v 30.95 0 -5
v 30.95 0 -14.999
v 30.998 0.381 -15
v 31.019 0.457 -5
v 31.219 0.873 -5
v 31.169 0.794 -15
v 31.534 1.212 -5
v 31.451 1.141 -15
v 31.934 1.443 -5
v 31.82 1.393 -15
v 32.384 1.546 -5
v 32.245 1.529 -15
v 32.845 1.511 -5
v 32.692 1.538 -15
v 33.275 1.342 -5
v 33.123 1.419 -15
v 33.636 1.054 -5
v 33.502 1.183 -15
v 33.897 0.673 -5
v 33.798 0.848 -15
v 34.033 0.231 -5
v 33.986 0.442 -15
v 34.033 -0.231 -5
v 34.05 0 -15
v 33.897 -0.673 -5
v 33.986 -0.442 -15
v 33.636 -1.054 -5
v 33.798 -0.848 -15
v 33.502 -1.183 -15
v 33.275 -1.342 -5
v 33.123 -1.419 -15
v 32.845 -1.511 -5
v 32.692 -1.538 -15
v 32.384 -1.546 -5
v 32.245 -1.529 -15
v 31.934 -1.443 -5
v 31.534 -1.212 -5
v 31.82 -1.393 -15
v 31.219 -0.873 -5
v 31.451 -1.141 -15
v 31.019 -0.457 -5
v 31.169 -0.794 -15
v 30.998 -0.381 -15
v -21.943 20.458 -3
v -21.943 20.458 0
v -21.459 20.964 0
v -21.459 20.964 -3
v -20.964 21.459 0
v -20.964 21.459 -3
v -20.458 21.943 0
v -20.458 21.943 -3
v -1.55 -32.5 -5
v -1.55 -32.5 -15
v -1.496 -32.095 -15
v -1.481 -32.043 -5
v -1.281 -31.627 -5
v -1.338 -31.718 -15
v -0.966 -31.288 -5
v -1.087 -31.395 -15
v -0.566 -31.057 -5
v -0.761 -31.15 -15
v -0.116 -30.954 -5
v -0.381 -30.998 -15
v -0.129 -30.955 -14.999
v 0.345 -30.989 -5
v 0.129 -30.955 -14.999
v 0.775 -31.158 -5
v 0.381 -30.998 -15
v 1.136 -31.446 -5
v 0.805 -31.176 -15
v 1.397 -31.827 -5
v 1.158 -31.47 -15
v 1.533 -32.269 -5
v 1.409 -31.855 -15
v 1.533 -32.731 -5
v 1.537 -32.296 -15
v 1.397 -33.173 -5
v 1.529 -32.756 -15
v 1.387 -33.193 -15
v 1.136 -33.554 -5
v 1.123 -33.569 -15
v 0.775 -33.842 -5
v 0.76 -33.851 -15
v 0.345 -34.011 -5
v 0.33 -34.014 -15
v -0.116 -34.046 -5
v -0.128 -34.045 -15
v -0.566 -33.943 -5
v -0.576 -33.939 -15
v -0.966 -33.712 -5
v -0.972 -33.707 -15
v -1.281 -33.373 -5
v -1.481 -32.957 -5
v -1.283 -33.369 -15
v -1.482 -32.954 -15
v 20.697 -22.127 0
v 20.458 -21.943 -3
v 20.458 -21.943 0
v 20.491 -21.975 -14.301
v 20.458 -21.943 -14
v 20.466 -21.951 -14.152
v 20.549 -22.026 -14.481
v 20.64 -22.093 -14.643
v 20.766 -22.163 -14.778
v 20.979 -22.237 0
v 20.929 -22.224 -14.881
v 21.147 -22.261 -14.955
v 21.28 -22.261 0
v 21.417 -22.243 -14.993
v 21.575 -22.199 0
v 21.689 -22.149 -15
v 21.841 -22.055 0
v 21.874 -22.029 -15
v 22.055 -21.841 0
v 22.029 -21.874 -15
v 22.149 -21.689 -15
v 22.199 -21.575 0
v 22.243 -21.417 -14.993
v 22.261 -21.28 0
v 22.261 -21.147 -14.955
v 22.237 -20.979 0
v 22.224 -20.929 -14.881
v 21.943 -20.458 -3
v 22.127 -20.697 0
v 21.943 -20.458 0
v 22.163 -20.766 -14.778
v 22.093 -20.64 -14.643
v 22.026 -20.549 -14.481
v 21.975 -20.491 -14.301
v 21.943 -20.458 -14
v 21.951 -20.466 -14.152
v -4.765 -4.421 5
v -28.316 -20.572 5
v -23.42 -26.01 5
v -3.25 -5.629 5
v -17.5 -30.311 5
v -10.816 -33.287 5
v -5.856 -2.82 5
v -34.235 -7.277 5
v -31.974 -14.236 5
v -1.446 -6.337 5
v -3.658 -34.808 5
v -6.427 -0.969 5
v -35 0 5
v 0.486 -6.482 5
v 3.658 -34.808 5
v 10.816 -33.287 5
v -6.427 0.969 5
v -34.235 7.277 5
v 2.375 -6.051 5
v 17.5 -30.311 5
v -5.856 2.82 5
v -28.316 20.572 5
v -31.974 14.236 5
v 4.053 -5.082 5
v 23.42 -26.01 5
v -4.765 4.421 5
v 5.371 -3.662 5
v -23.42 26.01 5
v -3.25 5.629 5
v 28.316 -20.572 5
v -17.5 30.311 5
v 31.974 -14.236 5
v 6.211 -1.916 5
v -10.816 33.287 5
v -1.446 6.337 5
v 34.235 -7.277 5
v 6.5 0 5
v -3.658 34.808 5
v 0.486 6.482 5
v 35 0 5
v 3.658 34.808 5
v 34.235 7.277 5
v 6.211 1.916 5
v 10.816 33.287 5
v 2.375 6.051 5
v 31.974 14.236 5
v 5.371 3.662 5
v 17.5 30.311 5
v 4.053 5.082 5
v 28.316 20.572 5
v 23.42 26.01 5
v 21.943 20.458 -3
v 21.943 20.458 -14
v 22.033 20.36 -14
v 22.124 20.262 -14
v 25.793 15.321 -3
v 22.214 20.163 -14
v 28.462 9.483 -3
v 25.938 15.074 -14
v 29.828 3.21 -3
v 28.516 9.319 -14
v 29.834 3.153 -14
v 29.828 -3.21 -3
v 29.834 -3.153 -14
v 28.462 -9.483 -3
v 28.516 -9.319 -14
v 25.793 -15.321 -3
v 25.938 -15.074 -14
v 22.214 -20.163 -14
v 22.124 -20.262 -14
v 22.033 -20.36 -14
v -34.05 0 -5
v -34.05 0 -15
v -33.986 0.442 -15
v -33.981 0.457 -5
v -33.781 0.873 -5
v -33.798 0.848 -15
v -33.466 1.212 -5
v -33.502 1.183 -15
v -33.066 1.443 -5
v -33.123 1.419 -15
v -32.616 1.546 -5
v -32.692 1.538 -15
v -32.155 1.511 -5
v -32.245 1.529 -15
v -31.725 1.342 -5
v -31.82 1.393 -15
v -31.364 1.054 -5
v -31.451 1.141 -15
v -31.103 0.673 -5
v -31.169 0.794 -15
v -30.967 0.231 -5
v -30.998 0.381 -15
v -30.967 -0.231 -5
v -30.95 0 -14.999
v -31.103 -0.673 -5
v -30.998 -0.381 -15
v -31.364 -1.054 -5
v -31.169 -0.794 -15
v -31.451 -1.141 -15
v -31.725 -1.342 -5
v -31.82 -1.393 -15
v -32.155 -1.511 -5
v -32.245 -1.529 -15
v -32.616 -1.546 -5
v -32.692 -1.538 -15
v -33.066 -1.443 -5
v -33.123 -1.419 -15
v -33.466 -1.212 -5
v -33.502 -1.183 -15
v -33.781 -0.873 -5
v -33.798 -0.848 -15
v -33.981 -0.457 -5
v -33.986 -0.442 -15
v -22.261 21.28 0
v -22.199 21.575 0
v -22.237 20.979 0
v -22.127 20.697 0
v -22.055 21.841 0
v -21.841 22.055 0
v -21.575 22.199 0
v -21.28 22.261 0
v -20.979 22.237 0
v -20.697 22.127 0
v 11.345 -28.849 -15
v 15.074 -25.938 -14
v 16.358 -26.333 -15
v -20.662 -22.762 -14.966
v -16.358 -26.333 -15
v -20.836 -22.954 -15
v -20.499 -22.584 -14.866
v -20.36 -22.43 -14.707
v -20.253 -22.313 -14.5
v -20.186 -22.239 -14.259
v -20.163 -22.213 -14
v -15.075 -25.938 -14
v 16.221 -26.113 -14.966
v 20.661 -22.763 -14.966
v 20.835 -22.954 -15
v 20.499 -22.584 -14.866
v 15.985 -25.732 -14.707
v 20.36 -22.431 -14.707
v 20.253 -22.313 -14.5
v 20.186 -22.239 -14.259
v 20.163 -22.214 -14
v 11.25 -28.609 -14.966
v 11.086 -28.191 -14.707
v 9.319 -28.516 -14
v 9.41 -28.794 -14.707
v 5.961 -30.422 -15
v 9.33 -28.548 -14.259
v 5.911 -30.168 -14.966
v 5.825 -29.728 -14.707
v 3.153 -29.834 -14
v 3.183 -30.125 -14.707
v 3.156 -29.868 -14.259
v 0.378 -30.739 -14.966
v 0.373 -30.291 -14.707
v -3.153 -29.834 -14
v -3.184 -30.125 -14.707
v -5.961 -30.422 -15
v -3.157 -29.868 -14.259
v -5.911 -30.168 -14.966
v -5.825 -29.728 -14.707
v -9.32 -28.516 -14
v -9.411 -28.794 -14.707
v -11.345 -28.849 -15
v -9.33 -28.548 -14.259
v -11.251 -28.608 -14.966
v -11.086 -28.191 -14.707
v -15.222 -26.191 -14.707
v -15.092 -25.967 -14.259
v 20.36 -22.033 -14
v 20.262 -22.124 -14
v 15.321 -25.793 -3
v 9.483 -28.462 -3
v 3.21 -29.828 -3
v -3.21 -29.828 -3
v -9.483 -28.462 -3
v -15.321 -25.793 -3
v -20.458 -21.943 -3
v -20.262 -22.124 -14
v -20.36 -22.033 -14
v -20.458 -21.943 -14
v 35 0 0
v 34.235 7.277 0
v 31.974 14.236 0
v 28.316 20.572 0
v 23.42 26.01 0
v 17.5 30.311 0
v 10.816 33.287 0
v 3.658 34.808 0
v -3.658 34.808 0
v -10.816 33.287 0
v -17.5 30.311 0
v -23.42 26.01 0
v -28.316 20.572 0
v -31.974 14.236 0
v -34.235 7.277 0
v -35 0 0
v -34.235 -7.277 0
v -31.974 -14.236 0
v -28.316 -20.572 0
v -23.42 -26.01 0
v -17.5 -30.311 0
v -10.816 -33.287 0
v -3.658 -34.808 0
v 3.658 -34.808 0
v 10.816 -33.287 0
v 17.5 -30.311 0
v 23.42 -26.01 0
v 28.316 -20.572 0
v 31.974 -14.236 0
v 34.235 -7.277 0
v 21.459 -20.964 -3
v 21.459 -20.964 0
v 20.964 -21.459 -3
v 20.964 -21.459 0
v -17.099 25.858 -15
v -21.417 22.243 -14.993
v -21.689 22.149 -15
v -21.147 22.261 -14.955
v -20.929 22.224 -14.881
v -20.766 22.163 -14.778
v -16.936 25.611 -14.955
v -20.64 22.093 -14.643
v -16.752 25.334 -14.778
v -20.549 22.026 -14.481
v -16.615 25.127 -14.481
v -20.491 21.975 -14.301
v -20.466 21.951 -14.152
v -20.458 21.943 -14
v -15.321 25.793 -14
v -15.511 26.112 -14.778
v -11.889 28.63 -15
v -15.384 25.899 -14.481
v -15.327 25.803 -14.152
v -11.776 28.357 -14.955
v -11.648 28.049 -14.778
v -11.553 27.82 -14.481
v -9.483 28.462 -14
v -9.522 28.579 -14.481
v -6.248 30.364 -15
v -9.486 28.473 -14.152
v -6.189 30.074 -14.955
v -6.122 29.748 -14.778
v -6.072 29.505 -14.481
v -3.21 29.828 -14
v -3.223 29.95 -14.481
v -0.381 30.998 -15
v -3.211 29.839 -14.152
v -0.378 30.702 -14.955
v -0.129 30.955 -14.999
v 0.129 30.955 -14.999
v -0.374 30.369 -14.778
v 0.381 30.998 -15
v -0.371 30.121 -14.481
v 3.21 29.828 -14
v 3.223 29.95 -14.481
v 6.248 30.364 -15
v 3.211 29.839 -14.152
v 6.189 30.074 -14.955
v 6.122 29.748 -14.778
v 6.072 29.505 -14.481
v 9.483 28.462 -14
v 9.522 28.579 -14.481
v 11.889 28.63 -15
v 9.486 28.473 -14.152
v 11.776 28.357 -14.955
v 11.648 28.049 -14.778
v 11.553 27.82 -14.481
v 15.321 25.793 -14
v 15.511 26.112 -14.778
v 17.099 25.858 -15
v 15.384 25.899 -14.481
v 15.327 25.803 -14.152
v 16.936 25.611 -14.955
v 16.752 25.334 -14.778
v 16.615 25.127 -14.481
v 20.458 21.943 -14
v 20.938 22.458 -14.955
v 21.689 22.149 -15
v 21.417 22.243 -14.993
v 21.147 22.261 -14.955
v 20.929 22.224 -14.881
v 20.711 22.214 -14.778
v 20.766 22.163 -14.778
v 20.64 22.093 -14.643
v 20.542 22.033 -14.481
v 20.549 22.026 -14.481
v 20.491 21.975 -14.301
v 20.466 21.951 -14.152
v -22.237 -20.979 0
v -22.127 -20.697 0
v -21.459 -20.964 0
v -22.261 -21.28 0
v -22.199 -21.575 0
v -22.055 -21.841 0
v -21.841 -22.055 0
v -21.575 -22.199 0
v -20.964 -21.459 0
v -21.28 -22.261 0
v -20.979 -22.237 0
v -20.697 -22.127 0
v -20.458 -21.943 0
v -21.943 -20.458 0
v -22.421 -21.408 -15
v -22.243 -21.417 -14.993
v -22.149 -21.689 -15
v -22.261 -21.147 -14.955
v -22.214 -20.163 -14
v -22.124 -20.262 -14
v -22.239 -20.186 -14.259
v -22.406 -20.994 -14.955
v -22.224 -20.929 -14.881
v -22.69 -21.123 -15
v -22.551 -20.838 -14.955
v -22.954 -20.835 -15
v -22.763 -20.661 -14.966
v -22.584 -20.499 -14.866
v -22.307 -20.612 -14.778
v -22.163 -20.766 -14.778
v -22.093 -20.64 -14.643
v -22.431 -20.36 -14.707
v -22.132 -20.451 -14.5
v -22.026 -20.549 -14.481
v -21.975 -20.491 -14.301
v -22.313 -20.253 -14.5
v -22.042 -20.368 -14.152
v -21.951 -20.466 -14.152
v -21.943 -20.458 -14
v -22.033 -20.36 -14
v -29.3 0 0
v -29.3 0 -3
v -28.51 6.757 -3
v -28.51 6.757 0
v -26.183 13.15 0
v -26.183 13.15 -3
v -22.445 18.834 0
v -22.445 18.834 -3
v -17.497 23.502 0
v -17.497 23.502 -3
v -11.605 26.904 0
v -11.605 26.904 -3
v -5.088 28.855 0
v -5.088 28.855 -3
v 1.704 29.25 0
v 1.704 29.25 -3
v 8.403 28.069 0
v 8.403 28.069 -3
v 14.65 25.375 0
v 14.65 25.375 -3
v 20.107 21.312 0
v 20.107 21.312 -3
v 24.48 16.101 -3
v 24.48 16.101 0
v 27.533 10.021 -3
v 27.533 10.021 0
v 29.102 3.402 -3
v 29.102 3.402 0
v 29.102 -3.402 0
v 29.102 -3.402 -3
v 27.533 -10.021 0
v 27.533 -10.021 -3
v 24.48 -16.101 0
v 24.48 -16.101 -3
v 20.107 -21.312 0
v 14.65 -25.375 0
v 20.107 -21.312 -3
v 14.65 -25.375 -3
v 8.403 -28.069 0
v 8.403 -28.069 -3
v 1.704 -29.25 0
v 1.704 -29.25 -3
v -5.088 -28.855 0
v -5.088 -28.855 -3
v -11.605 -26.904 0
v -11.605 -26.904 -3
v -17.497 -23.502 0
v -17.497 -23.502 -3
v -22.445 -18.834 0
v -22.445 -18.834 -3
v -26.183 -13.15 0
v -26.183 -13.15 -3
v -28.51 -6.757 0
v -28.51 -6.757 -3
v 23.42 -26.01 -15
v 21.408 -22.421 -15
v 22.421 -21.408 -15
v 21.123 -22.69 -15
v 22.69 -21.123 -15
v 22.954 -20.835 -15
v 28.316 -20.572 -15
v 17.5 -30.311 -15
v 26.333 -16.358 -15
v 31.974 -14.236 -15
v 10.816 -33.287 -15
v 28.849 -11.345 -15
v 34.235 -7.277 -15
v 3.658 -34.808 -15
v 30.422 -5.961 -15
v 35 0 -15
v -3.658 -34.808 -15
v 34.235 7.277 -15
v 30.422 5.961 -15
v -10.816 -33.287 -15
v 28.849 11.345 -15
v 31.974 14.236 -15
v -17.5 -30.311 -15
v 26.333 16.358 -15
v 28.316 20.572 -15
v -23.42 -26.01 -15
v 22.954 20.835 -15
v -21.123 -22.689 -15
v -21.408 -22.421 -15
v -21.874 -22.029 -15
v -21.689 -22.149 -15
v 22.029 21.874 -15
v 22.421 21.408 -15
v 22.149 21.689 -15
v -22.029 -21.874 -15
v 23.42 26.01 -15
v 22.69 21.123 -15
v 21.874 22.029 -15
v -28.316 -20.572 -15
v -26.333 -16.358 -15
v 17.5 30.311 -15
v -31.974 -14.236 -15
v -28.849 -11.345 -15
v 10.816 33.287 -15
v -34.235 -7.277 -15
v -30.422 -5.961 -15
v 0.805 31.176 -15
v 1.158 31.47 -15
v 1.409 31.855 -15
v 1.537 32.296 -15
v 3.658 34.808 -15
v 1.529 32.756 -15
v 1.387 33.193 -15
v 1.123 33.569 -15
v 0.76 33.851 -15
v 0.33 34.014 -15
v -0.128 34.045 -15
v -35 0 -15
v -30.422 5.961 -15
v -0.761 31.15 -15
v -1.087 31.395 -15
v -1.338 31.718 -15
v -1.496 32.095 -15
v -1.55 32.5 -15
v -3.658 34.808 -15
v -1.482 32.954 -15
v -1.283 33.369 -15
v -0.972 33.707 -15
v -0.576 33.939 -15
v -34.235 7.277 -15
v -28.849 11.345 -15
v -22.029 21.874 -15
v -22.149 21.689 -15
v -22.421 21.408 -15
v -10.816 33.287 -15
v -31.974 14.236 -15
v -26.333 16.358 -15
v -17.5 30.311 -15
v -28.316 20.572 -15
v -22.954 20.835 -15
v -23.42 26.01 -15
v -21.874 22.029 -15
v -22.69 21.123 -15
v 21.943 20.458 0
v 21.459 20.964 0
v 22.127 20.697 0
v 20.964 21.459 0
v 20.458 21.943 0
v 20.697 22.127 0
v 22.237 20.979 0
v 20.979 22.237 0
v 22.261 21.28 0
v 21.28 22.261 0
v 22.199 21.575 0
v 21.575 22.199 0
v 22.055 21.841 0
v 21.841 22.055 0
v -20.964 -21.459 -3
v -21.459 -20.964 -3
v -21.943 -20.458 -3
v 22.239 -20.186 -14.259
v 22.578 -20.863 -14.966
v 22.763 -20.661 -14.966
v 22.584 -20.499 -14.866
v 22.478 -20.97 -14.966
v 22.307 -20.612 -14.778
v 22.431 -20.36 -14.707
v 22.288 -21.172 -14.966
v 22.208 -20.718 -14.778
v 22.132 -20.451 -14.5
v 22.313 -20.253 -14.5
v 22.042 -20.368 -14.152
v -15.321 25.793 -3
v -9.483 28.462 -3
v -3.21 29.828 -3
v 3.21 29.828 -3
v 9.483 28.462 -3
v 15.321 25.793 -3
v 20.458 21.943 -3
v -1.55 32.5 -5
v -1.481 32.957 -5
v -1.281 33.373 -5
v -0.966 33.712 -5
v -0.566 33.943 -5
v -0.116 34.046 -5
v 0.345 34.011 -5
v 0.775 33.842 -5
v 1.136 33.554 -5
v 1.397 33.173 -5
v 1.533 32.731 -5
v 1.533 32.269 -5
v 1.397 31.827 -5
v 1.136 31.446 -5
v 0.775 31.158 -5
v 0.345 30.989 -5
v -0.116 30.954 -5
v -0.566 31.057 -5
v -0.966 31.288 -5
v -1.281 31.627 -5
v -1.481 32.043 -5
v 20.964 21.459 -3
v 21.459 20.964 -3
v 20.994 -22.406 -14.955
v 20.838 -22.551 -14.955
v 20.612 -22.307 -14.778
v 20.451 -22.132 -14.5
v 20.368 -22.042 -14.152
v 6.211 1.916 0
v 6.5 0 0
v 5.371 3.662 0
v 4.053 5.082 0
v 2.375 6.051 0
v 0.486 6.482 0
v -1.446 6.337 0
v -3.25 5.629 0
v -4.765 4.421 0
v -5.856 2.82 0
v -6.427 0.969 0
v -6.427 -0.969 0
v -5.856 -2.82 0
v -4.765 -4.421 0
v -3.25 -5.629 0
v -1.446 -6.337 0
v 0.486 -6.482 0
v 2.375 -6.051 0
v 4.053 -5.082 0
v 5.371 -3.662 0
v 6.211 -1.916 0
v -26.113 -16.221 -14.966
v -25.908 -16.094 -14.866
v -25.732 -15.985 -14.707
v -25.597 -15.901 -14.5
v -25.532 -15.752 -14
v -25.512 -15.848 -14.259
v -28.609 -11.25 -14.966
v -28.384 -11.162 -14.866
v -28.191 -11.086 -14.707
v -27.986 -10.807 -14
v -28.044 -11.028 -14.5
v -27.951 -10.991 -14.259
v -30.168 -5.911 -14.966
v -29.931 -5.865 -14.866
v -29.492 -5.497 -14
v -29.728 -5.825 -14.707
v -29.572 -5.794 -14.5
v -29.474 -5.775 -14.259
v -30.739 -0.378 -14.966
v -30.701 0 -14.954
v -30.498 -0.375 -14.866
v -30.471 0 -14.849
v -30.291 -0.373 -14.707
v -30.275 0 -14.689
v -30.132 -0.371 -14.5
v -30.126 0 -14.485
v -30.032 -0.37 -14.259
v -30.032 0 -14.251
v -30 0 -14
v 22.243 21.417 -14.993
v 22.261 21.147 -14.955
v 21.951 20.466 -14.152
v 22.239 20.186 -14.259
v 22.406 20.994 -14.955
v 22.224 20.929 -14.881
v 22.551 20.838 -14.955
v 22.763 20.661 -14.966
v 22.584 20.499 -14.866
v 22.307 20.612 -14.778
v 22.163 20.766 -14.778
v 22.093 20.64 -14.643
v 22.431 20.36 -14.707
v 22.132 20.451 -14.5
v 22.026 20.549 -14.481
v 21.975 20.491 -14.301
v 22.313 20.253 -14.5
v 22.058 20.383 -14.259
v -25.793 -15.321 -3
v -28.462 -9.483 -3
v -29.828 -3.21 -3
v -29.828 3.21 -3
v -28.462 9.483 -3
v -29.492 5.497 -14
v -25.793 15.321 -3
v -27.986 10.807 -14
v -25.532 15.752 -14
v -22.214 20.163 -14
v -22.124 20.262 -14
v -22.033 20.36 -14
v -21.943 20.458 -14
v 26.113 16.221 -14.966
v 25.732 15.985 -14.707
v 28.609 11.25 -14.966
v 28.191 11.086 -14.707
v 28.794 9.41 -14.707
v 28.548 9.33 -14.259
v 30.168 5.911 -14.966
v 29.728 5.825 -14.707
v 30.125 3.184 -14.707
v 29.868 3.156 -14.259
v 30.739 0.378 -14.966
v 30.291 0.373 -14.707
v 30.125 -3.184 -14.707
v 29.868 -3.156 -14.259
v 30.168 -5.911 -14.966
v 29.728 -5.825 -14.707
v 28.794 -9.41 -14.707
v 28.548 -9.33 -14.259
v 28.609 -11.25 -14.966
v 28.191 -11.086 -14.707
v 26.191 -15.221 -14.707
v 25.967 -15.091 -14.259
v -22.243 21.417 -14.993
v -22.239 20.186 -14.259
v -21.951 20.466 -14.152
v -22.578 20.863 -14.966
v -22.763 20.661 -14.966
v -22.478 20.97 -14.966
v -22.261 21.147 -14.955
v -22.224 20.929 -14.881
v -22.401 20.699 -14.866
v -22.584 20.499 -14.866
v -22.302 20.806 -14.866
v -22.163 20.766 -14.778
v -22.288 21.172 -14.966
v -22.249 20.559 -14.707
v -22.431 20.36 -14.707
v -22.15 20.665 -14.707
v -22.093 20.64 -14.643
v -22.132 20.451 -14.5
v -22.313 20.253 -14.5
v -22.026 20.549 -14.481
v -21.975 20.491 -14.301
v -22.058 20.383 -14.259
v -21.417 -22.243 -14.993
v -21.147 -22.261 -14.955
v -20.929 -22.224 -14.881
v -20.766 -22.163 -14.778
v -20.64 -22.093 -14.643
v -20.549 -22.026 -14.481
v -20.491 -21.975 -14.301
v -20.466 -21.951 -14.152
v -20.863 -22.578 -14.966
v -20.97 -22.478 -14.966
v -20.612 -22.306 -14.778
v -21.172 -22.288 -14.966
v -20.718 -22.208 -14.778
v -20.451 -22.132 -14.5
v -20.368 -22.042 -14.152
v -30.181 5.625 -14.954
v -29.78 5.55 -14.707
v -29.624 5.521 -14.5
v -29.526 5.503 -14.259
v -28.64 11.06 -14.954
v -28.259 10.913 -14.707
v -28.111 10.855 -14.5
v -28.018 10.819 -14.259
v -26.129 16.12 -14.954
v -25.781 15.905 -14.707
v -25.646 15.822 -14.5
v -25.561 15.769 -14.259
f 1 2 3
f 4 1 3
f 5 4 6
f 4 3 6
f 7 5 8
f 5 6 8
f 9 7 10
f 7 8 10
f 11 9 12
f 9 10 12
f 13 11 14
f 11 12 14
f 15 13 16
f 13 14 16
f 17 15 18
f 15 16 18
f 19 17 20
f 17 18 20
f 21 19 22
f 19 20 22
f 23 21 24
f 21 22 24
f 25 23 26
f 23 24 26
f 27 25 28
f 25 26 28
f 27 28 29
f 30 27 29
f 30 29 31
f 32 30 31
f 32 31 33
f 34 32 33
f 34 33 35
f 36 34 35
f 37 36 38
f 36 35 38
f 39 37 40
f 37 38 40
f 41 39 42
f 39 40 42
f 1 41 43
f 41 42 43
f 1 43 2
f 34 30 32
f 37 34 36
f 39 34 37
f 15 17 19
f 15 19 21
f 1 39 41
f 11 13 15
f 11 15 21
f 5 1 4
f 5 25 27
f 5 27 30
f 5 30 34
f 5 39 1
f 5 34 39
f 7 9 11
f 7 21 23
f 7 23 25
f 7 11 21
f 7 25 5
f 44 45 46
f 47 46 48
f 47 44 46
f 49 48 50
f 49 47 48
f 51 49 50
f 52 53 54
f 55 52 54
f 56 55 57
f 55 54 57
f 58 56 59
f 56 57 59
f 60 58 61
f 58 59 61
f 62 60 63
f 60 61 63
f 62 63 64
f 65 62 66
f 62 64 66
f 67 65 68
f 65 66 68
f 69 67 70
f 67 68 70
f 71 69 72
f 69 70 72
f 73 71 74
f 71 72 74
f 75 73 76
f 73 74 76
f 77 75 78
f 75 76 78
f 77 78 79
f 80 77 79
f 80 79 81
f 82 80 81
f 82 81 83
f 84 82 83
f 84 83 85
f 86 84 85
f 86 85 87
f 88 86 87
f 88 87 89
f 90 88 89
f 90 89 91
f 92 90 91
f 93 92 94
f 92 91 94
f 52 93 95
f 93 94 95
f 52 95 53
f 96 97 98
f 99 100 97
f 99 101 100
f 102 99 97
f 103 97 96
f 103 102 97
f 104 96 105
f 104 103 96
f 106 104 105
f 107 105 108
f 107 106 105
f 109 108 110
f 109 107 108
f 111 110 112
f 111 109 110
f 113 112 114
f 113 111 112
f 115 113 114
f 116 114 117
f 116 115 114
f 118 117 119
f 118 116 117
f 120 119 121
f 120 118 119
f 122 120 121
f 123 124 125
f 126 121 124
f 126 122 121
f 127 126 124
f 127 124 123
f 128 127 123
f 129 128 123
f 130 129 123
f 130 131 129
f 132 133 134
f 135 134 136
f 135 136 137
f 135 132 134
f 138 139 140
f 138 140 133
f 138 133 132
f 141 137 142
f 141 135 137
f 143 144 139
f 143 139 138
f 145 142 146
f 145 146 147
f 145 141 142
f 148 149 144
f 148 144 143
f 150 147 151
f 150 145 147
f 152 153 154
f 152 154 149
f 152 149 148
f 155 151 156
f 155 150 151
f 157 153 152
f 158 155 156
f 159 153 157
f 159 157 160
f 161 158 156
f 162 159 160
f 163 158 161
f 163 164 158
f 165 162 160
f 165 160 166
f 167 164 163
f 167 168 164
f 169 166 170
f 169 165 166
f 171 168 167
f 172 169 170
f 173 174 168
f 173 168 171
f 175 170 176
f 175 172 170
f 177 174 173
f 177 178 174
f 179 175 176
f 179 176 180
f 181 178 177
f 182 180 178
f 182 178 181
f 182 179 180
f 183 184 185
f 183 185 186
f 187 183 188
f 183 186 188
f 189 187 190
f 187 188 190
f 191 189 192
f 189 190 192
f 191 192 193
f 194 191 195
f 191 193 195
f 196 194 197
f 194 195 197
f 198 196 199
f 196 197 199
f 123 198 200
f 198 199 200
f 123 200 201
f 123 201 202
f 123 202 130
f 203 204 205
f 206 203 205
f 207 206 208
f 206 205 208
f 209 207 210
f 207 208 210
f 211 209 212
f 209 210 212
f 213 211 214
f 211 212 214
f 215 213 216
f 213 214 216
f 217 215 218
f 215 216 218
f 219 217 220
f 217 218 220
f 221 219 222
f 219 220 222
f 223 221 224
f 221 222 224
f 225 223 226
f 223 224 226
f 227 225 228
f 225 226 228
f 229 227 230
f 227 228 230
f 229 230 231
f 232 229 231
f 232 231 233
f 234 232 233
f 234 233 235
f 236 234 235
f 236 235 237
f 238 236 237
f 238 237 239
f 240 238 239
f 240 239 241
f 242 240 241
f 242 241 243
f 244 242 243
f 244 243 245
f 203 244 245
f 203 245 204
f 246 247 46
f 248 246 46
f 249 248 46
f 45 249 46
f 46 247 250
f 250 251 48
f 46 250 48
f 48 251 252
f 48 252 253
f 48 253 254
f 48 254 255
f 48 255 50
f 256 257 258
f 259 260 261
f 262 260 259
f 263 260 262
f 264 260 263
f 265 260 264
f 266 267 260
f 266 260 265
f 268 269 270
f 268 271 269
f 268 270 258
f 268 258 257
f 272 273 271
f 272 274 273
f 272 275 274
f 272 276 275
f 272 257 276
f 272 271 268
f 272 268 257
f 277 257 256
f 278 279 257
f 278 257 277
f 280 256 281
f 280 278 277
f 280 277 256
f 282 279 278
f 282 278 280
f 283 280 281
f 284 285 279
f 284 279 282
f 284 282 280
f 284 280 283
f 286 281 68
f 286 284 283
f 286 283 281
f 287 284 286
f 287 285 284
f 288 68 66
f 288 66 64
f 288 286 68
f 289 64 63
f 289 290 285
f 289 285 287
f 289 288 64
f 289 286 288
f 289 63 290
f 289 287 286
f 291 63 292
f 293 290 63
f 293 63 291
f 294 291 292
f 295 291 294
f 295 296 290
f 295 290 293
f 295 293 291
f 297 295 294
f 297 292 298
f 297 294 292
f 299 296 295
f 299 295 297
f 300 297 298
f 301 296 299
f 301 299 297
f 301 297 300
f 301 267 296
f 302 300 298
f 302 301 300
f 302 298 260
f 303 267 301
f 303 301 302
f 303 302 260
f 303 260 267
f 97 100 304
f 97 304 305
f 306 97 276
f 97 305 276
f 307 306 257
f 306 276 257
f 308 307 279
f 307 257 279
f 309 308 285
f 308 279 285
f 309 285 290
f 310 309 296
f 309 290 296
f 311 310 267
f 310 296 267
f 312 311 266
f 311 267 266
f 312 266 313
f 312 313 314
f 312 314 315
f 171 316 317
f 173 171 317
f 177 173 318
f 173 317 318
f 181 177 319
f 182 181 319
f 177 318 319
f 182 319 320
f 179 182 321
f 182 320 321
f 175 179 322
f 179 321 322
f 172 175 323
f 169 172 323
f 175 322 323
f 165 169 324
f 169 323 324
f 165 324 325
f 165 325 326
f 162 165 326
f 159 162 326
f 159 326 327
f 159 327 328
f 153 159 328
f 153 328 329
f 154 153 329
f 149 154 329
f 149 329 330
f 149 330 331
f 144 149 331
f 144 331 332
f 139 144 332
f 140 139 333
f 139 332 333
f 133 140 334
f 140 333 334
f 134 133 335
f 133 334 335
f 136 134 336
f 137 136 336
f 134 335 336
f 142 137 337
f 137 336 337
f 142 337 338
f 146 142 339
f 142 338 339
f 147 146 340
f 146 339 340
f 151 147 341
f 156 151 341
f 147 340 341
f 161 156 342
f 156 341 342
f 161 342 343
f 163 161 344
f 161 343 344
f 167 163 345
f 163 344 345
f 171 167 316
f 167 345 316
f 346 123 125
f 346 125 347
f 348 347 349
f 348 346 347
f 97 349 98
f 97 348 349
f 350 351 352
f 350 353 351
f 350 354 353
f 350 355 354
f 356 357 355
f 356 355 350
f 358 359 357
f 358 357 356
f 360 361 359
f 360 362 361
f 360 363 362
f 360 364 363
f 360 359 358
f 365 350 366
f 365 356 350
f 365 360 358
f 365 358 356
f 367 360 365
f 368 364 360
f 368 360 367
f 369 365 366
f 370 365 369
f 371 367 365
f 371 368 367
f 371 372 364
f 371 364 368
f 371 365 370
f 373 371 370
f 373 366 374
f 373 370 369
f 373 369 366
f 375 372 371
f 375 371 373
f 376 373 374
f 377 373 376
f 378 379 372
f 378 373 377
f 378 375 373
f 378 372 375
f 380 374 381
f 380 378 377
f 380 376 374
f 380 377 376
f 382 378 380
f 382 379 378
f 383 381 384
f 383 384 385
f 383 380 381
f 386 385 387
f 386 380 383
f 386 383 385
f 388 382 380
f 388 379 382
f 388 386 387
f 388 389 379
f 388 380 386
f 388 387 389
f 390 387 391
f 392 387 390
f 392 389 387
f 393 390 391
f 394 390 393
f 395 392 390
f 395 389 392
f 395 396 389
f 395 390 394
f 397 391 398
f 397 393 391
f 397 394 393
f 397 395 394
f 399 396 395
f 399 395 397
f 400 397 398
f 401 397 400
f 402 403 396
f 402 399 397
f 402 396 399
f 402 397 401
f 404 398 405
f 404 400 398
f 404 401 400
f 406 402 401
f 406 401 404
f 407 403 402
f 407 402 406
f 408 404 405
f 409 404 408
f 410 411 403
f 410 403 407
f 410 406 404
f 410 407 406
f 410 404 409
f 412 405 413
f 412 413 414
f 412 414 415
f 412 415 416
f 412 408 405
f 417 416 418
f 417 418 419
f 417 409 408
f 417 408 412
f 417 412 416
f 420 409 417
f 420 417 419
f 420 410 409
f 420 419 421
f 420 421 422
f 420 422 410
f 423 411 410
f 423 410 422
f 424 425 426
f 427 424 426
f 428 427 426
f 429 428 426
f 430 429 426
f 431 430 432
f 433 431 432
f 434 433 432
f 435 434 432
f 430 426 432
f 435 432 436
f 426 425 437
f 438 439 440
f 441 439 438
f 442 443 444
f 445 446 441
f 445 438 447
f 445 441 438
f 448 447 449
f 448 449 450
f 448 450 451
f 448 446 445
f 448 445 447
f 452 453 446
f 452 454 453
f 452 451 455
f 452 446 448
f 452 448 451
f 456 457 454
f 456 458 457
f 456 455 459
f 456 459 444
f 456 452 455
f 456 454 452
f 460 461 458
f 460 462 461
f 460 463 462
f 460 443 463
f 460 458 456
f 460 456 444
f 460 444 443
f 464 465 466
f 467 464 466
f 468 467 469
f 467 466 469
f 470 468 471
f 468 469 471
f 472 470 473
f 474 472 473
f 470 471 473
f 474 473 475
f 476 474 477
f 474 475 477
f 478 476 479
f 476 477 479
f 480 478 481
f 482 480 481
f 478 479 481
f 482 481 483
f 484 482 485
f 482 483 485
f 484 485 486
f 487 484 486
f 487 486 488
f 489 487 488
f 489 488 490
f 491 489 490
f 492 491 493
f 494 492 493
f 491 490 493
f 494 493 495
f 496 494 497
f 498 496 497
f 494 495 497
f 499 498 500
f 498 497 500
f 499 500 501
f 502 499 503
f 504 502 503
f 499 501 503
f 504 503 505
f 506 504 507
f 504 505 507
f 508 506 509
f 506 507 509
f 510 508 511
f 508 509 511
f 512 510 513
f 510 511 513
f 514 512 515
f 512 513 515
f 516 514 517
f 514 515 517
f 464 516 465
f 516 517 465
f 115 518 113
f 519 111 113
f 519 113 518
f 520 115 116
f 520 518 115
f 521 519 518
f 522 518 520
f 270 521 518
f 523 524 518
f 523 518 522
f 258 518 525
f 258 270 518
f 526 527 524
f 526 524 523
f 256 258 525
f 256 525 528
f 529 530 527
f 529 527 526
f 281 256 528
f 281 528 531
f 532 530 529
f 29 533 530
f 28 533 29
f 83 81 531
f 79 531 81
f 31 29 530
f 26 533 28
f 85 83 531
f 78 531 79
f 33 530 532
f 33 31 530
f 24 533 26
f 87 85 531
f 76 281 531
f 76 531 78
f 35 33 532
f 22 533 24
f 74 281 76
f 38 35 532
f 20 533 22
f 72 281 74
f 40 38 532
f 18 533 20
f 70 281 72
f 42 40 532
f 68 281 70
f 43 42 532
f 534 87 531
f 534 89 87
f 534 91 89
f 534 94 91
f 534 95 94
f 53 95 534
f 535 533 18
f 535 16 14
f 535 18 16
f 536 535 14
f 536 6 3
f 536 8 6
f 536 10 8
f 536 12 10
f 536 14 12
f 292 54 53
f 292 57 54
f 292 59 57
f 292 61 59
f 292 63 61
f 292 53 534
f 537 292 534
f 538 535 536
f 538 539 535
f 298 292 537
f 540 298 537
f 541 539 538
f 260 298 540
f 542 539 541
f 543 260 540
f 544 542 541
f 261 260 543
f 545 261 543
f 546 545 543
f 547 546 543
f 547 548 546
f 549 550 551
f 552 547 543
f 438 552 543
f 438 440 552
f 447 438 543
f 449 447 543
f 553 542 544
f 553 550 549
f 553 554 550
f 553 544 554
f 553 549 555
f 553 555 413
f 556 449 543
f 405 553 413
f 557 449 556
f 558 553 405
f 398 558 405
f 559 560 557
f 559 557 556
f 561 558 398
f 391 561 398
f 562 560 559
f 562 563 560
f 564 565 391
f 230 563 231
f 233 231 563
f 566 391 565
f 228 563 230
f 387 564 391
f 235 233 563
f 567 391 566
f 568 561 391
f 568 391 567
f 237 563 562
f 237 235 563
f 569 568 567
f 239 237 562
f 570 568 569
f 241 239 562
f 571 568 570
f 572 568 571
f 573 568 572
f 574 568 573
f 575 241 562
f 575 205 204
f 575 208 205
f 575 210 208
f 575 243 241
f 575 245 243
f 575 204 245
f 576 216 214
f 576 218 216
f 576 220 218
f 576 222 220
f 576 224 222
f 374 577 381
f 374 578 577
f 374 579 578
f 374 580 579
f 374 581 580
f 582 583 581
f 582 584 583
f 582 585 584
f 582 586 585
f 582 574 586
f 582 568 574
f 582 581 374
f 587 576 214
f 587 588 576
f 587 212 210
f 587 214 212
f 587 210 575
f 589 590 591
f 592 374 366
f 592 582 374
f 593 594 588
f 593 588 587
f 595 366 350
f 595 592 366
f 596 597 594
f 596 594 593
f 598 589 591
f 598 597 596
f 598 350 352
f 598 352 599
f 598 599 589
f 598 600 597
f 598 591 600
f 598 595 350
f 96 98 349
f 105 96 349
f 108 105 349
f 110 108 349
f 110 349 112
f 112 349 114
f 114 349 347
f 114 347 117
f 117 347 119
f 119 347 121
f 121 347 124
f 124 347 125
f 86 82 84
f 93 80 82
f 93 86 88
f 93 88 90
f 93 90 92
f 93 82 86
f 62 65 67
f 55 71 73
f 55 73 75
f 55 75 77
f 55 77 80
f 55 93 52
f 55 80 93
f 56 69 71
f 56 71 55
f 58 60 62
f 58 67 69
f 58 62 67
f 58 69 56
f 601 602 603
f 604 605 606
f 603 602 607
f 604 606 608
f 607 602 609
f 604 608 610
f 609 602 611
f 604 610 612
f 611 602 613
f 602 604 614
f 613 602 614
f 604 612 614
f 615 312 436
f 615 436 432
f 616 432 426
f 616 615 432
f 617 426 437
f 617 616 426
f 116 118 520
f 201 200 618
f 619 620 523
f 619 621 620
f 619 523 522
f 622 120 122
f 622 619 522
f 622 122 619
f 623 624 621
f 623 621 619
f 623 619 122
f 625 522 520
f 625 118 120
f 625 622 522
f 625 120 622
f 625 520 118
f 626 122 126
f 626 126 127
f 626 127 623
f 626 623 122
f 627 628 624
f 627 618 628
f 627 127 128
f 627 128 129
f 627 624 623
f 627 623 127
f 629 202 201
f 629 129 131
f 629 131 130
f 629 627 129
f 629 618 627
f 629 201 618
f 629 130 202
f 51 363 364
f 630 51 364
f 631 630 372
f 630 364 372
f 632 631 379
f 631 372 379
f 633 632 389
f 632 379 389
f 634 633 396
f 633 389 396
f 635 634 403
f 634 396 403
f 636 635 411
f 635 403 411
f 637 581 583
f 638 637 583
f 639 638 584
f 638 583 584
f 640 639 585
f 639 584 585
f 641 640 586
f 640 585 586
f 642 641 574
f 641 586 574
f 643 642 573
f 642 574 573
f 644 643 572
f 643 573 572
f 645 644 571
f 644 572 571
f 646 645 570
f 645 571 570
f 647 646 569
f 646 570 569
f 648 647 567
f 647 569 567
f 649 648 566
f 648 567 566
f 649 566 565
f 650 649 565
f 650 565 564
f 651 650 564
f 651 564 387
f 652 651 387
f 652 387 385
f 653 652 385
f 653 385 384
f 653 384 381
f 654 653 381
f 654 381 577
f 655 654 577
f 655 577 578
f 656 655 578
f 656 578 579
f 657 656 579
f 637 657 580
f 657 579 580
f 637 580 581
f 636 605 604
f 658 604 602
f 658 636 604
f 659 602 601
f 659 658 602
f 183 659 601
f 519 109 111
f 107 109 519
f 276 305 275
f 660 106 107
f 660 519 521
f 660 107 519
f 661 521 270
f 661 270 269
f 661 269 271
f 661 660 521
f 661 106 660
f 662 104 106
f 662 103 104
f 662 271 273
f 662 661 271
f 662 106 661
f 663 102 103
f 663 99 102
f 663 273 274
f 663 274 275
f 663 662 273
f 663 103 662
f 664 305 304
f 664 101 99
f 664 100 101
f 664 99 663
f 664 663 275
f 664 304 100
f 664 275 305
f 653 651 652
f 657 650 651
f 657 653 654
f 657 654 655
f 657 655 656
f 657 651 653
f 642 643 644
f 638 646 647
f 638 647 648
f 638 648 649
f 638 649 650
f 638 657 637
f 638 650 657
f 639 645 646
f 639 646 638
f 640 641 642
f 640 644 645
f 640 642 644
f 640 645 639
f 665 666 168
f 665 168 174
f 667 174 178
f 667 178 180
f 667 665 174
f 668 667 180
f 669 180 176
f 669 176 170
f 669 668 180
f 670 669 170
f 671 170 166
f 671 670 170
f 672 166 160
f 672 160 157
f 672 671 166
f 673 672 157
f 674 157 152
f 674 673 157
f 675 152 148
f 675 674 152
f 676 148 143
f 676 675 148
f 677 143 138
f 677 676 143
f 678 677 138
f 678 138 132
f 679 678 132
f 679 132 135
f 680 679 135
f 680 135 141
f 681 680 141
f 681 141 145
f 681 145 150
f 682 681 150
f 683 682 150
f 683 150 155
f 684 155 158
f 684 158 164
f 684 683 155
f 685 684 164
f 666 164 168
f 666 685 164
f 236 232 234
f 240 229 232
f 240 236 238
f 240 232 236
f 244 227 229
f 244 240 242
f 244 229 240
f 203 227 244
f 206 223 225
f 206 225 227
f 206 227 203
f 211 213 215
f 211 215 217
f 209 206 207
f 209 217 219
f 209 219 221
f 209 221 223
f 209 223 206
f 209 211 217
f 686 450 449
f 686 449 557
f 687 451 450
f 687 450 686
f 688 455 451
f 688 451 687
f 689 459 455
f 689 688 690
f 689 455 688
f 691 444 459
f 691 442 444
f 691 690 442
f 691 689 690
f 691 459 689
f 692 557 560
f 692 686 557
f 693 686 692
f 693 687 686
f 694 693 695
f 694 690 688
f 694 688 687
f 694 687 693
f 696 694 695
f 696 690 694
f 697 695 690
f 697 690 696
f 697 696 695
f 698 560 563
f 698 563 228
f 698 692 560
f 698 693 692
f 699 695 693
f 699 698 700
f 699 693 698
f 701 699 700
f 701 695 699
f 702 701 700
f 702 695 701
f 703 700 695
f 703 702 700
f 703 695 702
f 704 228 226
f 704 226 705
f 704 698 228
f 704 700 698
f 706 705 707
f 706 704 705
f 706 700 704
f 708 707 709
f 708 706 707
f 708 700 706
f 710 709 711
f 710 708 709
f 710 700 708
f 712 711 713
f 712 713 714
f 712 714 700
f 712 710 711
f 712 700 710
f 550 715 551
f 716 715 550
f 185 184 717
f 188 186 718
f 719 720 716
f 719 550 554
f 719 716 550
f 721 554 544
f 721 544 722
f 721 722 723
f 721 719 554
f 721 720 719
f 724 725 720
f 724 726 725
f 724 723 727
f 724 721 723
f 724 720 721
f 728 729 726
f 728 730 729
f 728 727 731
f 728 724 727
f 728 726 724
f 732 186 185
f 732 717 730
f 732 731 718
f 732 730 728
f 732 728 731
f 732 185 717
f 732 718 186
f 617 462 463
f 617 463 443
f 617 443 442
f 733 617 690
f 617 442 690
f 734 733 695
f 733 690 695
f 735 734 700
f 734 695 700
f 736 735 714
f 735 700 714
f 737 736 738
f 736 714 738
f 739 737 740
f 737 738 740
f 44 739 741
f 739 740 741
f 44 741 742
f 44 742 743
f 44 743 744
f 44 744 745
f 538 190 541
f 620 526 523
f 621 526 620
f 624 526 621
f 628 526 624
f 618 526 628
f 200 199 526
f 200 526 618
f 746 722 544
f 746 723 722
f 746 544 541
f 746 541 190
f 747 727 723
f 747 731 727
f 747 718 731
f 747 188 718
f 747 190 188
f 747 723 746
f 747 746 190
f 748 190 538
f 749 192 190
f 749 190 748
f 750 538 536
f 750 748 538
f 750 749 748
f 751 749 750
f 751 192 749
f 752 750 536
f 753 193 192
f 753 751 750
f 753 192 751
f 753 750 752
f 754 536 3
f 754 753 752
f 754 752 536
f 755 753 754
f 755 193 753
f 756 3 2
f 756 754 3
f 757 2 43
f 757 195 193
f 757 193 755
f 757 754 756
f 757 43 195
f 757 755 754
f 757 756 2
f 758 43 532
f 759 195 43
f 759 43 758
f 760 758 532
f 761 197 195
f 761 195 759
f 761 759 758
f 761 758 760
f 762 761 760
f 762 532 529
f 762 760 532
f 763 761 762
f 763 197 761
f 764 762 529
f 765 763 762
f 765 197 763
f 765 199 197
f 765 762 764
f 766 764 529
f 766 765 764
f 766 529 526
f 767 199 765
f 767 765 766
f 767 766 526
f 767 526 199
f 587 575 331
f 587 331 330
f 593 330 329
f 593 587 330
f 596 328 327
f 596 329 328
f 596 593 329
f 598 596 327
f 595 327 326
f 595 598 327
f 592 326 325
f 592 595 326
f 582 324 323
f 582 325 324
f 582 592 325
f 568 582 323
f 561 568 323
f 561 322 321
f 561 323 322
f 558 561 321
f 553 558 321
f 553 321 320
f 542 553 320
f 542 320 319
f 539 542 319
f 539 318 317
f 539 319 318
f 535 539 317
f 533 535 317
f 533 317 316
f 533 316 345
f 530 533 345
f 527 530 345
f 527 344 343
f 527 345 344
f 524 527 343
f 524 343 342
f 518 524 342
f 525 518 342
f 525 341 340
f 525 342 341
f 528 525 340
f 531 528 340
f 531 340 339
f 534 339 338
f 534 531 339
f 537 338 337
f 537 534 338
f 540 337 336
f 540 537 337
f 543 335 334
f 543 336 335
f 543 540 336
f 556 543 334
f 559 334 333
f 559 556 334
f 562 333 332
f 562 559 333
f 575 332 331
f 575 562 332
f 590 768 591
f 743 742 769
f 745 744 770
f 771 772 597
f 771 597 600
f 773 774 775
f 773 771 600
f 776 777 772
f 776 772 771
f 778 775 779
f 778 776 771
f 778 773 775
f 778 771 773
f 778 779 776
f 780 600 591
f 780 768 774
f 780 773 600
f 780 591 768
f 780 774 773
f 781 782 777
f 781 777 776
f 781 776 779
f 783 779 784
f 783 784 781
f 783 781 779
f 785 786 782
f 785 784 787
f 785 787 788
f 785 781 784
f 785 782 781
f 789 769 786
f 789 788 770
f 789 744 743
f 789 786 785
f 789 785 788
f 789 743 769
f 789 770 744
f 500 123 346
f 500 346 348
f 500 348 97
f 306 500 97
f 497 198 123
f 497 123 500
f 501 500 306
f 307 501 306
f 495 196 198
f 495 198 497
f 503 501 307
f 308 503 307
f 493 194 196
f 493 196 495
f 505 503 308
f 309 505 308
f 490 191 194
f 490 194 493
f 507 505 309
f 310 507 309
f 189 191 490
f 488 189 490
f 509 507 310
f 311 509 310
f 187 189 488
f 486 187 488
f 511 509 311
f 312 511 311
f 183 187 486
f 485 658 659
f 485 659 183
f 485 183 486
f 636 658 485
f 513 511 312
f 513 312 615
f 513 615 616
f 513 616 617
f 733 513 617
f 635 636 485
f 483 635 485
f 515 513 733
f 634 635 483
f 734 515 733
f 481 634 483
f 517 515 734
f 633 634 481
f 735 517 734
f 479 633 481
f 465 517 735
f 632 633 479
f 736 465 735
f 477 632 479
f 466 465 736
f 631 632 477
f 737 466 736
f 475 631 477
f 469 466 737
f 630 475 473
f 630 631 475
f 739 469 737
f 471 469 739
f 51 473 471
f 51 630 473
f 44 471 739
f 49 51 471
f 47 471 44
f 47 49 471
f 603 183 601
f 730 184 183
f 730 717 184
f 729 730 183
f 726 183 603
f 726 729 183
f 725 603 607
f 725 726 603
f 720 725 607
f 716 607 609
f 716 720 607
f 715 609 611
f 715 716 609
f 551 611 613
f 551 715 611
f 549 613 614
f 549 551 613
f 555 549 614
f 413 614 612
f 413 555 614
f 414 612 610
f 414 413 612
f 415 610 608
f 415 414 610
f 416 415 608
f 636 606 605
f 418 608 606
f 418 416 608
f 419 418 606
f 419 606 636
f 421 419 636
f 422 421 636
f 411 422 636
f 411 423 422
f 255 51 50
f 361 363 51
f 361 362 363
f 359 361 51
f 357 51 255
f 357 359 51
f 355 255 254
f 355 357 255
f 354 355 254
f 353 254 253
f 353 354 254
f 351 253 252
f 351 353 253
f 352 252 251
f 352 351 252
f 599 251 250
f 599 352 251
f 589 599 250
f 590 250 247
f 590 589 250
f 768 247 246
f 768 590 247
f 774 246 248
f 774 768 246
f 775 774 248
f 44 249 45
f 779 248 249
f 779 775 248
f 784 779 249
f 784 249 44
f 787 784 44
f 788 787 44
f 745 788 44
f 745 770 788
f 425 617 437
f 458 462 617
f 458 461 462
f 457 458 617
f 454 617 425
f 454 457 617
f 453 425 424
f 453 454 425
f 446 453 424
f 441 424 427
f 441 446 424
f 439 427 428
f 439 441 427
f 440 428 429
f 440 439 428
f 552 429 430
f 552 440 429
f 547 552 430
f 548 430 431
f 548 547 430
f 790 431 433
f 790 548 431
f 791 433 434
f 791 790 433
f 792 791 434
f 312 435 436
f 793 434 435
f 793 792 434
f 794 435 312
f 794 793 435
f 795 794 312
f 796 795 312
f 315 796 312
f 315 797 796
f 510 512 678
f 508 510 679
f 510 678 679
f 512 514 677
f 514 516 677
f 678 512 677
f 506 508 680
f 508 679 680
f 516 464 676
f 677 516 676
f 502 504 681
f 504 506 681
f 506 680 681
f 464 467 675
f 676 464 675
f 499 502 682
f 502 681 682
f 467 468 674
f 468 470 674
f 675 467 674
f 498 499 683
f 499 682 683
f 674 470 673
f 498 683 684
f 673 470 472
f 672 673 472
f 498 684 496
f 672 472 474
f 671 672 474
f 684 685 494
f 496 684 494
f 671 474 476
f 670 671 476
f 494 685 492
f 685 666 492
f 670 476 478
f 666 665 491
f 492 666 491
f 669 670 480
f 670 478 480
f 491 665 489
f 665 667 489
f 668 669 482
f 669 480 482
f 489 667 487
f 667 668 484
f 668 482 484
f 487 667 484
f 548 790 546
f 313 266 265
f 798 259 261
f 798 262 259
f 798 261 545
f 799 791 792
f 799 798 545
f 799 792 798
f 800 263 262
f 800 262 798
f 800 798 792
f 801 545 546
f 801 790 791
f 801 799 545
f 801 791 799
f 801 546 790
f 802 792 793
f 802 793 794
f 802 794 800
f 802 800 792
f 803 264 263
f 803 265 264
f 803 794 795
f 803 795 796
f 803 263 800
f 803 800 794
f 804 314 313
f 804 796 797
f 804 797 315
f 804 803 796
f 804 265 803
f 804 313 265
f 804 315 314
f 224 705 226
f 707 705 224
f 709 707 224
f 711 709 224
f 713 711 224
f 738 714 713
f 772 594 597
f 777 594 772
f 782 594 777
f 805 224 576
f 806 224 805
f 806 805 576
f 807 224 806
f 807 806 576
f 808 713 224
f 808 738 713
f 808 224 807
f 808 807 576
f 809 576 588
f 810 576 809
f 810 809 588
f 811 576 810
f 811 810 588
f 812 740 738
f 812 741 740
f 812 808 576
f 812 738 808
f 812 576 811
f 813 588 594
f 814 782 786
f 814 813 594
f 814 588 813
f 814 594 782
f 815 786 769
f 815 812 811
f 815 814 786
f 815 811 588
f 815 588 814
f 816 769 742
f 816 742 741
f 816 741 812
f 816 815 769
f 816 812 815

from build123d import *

# Parameters (mm, degrees)
SKETCH_2_R          = 35
SKETCH_2_R_2        = 6.5
EXTRUDE_1_DEPTH     = 5
EXTRUDE_START       = 15
SKETCH_3_R          = 35
SKETCH_3_R_2        = 30
EXTRUDE_2_DEPTH     = 15
SKETCH_4_R          = 1.55
CUT_EXTRUDE_1_DEPTH = 10
CUT_EXTRUDE_5_DEPTH = 15
FILLET_1_R          = 1
EXTRUDE_START_2     = 3
SKETCH_10_R         = 30
SKETCH_10_R_2       = 29.3
EXTRUDE_3_DEPTH     = 3


with BuildPart() as part:
    # 草图2 → 凸台-拉伸1 (new body)
    with BuildSketch(Plane.XY):
        Circle(SKETCH_2_R)
        Circle(SKETCH_2_R_2, mode=Mode.SUBTRACT)
    extrude(amount=EXTRUDE_1_DEPTH)

    # 草图3 → 凸台-拉伸2 (add)
    with BuildSketch(Plane(origin=(0, 0, 0), x_dir=(-1, 0, 0), z_dir=(0, 0, -1)).offset(EXTRUDE_START)):
        Circle(SKETCH_3_R)
        Circle(SKETCH_3_R_2, mode=Mode.SUBTRACT)
    extrude(amount=-EXTRUDE_2_DEPTH)

    # 草图4 → 切除-拉伸1 (cut)
    with BuildSketch(Plane(origin=(0, 0, -15), x_dir=(-1, 0, 0), z_dir=(0, 0, -1))):
        with Locations((0, 32.5)):
            Circle(SKETCH_4_R)
        with Locations((32.5, 0)):
            Circle(SKETCH_4_R)
        with Locations((0, -32.5)):
            Circle(SKETCH_4_R)
        with Locations((-32.5, 0)):
            Circle(SKETCH_4_R)
    extrude(amount=-CUT_EXTRUDE_1_DEPTH, mode=Mode.SUBTRACT)

    # 草图9 → 切除-拉伸5 (cut)
    with BuildSketch(Plane(origin=(0, 0, -15), x_dir=(-1, 0, 0), z_dir=(0, 0, -1))):
        with BuildLine():
            ThreePointArc((-21.942558771, 20.457861926), (-21.955665556, 21.955665556), (-20.457861926, 21.942558771))
            ThreePointArc((-20.457861926, 21.942558771), (-21.213203436, 21.213203436), (-21.942558771, 20.457861926))
        make_face()
        with BuildLine():
            ThreePointArc((20.457861926, 21.942558771), (21.955665556, 21.955665556), (21.942558771, 20.457861926))
            ThreePointArc((21.942558771, 20.457861926), (21.213203436, 21.213203436), (20.457861926, 21.942558771))
        make_face()
        with BuildLine():
            ThreePointArc((21.942558771, -20.457861926), (21.955665556, -21.955665556), (20.457861926, -21.942558771))
            ThreePointArc((20.457861926, -21.942558771), (21.213203436, -21.213203436), (21.942558771, -20.457861926))
        make_face()
        with BuildLine():
            ThreePointArc((-20.457861926, -21.942558771), (-21.955665556, -21.955665556), (-21.942558771, -20.457861926))
            ThreePointArc((-21.942558771, -20.457861926), (-21.213203436, -21.213203436), (-20.457861926, -21.942558771))
        make_face()
    extrude(amount=-CUT_EXTRUDE_5_DEPTH, mode=Mode.SUBTRACT)

    # 圆角1
    # the kernel refuses this fillet: 1 mm, written as the material it takes off along each edge
    with BuildSketch(Plane(origin=(0, 0, -15), x_dir=(-0.740463861633537, 0.6720961758667804, 0), z_dir=(-0.6720961758667804, -0.740463861633537, 0))) as fillet_1_piece_1:
        with BuildLine():
            CenterArc((30 + FILLET_1_R, -FILLET_1_R), FILLET_1_R, 90, 90)
            Line((30, -FILLET_1_R), (30, 0))
            Line((30, 0), (30 + FILLET_1_R, 0))
        make_face()
    revolve(axis=Axis((0, 0, -15), (0, 0, -1)), revolution_arc=95.541888931, mode=Mode.SUBTRACT)
    with BuildSketch(Plane(origin=(0, 0, -15), x_dir=(0.6720961758667806, 0.7404638616335367, 0), z_dir=(-0.7404638616335367, 0.6720961758667806, 0))) as fillet_1_piece_2:
        with BuildLine():
            CenterArc((30 + FILLET_1_R, -FILLET_1_R), FILLET_1_R, 90, 90)
            Line((30, -FILLET_1_R), (30, 0))
            Line((30, 0), (30 + FILLET_1_R, 0))
        make_face()
    revolve(axis=Axis((0, 0, -15), (0, 0, -1)), revolution_arc=95.541888931, mode=Mode.SUBTRACT)
    with BuildSketch(Plane(origin=(0, 0, -15), x_dir=(0.7404638616335368, -0.6720961758667805, 0), z_dir=(0.6720961758667805, 0.7404638616335368, 0))) as fillet_1_piece_3:
        with BuildLine():
            CenterArc((30 + FILLET_1_R, -FILLET_1_R), FILLET_1_R, 90, 90)
            Line((30, -FILLET_1_R), (30, 0))
            Line((30, 0), (30 + FILLET_1_R, 0))
        make_face()
    revolve(axis=Axis((0, 0, -15), (0, 0, -1)), revolution_arc=95.541888931, mode=Mode.SUBTRACT)
    with BuildSketch(Plane(origin=(0, 0, -15), x_dir=(-1, 0, 0), z_dir=(0, -1, 0))) as fillet_1_piece_4:
        with BuildLine():
            CenterArc((30 + FILLET_1_R, -FILLET_1_R), FILLET_1_R, 90, 90)
            Line((30, -FILLET_1_R), (30, 0))
            Line((30, 0), (30 + FILLET_1_R, 0))
        make_face()
    revolve(axis=Axis((0, 0, -15), (0, 0, -1)), revolution_arc=47.769631262, mode=Mode.SUBTRACT)
    with BuildSketch(Plane(origin=(0, 0, -15), x_dir=(-0.6721131469252694, -0.7404484571732264, 0), z_dir=(0.7404484571732264, -0.6721131469252694, 0))) as fillet_1_piece_5:
        with BuildLine():
            CenterArc((30 + FILLET_1_R, -FILLET_1_R), FILLET_1_R, 90, 90)
            Line((30, -FILLET_1_R), (30, 0))
            Line((30, 0), (30 + FILLET_1_R, 0))
        make_face()
    revolve(axis=Axis((0, 0, -15), (0, 0, -1)), revolution_arc=47.769631262, mode=Mode.SUBTRACT)

    # 草图10 → 凸台-拉伸3 (add)
    with BuildSketch(Plane(origin=(0, 0, 0), x_dir=(-1, 0, 0), z_dir=(0, 0, -1)).offset(EXTRUDE_START_2)):
        Circle(SKETCH_10_R)
        Circle(SKETCH_10_R_2, mode=Mode.SUBTRACT)
    extrude(amount=-EXTRUDE_3_DEPTH)


solid = part.part
